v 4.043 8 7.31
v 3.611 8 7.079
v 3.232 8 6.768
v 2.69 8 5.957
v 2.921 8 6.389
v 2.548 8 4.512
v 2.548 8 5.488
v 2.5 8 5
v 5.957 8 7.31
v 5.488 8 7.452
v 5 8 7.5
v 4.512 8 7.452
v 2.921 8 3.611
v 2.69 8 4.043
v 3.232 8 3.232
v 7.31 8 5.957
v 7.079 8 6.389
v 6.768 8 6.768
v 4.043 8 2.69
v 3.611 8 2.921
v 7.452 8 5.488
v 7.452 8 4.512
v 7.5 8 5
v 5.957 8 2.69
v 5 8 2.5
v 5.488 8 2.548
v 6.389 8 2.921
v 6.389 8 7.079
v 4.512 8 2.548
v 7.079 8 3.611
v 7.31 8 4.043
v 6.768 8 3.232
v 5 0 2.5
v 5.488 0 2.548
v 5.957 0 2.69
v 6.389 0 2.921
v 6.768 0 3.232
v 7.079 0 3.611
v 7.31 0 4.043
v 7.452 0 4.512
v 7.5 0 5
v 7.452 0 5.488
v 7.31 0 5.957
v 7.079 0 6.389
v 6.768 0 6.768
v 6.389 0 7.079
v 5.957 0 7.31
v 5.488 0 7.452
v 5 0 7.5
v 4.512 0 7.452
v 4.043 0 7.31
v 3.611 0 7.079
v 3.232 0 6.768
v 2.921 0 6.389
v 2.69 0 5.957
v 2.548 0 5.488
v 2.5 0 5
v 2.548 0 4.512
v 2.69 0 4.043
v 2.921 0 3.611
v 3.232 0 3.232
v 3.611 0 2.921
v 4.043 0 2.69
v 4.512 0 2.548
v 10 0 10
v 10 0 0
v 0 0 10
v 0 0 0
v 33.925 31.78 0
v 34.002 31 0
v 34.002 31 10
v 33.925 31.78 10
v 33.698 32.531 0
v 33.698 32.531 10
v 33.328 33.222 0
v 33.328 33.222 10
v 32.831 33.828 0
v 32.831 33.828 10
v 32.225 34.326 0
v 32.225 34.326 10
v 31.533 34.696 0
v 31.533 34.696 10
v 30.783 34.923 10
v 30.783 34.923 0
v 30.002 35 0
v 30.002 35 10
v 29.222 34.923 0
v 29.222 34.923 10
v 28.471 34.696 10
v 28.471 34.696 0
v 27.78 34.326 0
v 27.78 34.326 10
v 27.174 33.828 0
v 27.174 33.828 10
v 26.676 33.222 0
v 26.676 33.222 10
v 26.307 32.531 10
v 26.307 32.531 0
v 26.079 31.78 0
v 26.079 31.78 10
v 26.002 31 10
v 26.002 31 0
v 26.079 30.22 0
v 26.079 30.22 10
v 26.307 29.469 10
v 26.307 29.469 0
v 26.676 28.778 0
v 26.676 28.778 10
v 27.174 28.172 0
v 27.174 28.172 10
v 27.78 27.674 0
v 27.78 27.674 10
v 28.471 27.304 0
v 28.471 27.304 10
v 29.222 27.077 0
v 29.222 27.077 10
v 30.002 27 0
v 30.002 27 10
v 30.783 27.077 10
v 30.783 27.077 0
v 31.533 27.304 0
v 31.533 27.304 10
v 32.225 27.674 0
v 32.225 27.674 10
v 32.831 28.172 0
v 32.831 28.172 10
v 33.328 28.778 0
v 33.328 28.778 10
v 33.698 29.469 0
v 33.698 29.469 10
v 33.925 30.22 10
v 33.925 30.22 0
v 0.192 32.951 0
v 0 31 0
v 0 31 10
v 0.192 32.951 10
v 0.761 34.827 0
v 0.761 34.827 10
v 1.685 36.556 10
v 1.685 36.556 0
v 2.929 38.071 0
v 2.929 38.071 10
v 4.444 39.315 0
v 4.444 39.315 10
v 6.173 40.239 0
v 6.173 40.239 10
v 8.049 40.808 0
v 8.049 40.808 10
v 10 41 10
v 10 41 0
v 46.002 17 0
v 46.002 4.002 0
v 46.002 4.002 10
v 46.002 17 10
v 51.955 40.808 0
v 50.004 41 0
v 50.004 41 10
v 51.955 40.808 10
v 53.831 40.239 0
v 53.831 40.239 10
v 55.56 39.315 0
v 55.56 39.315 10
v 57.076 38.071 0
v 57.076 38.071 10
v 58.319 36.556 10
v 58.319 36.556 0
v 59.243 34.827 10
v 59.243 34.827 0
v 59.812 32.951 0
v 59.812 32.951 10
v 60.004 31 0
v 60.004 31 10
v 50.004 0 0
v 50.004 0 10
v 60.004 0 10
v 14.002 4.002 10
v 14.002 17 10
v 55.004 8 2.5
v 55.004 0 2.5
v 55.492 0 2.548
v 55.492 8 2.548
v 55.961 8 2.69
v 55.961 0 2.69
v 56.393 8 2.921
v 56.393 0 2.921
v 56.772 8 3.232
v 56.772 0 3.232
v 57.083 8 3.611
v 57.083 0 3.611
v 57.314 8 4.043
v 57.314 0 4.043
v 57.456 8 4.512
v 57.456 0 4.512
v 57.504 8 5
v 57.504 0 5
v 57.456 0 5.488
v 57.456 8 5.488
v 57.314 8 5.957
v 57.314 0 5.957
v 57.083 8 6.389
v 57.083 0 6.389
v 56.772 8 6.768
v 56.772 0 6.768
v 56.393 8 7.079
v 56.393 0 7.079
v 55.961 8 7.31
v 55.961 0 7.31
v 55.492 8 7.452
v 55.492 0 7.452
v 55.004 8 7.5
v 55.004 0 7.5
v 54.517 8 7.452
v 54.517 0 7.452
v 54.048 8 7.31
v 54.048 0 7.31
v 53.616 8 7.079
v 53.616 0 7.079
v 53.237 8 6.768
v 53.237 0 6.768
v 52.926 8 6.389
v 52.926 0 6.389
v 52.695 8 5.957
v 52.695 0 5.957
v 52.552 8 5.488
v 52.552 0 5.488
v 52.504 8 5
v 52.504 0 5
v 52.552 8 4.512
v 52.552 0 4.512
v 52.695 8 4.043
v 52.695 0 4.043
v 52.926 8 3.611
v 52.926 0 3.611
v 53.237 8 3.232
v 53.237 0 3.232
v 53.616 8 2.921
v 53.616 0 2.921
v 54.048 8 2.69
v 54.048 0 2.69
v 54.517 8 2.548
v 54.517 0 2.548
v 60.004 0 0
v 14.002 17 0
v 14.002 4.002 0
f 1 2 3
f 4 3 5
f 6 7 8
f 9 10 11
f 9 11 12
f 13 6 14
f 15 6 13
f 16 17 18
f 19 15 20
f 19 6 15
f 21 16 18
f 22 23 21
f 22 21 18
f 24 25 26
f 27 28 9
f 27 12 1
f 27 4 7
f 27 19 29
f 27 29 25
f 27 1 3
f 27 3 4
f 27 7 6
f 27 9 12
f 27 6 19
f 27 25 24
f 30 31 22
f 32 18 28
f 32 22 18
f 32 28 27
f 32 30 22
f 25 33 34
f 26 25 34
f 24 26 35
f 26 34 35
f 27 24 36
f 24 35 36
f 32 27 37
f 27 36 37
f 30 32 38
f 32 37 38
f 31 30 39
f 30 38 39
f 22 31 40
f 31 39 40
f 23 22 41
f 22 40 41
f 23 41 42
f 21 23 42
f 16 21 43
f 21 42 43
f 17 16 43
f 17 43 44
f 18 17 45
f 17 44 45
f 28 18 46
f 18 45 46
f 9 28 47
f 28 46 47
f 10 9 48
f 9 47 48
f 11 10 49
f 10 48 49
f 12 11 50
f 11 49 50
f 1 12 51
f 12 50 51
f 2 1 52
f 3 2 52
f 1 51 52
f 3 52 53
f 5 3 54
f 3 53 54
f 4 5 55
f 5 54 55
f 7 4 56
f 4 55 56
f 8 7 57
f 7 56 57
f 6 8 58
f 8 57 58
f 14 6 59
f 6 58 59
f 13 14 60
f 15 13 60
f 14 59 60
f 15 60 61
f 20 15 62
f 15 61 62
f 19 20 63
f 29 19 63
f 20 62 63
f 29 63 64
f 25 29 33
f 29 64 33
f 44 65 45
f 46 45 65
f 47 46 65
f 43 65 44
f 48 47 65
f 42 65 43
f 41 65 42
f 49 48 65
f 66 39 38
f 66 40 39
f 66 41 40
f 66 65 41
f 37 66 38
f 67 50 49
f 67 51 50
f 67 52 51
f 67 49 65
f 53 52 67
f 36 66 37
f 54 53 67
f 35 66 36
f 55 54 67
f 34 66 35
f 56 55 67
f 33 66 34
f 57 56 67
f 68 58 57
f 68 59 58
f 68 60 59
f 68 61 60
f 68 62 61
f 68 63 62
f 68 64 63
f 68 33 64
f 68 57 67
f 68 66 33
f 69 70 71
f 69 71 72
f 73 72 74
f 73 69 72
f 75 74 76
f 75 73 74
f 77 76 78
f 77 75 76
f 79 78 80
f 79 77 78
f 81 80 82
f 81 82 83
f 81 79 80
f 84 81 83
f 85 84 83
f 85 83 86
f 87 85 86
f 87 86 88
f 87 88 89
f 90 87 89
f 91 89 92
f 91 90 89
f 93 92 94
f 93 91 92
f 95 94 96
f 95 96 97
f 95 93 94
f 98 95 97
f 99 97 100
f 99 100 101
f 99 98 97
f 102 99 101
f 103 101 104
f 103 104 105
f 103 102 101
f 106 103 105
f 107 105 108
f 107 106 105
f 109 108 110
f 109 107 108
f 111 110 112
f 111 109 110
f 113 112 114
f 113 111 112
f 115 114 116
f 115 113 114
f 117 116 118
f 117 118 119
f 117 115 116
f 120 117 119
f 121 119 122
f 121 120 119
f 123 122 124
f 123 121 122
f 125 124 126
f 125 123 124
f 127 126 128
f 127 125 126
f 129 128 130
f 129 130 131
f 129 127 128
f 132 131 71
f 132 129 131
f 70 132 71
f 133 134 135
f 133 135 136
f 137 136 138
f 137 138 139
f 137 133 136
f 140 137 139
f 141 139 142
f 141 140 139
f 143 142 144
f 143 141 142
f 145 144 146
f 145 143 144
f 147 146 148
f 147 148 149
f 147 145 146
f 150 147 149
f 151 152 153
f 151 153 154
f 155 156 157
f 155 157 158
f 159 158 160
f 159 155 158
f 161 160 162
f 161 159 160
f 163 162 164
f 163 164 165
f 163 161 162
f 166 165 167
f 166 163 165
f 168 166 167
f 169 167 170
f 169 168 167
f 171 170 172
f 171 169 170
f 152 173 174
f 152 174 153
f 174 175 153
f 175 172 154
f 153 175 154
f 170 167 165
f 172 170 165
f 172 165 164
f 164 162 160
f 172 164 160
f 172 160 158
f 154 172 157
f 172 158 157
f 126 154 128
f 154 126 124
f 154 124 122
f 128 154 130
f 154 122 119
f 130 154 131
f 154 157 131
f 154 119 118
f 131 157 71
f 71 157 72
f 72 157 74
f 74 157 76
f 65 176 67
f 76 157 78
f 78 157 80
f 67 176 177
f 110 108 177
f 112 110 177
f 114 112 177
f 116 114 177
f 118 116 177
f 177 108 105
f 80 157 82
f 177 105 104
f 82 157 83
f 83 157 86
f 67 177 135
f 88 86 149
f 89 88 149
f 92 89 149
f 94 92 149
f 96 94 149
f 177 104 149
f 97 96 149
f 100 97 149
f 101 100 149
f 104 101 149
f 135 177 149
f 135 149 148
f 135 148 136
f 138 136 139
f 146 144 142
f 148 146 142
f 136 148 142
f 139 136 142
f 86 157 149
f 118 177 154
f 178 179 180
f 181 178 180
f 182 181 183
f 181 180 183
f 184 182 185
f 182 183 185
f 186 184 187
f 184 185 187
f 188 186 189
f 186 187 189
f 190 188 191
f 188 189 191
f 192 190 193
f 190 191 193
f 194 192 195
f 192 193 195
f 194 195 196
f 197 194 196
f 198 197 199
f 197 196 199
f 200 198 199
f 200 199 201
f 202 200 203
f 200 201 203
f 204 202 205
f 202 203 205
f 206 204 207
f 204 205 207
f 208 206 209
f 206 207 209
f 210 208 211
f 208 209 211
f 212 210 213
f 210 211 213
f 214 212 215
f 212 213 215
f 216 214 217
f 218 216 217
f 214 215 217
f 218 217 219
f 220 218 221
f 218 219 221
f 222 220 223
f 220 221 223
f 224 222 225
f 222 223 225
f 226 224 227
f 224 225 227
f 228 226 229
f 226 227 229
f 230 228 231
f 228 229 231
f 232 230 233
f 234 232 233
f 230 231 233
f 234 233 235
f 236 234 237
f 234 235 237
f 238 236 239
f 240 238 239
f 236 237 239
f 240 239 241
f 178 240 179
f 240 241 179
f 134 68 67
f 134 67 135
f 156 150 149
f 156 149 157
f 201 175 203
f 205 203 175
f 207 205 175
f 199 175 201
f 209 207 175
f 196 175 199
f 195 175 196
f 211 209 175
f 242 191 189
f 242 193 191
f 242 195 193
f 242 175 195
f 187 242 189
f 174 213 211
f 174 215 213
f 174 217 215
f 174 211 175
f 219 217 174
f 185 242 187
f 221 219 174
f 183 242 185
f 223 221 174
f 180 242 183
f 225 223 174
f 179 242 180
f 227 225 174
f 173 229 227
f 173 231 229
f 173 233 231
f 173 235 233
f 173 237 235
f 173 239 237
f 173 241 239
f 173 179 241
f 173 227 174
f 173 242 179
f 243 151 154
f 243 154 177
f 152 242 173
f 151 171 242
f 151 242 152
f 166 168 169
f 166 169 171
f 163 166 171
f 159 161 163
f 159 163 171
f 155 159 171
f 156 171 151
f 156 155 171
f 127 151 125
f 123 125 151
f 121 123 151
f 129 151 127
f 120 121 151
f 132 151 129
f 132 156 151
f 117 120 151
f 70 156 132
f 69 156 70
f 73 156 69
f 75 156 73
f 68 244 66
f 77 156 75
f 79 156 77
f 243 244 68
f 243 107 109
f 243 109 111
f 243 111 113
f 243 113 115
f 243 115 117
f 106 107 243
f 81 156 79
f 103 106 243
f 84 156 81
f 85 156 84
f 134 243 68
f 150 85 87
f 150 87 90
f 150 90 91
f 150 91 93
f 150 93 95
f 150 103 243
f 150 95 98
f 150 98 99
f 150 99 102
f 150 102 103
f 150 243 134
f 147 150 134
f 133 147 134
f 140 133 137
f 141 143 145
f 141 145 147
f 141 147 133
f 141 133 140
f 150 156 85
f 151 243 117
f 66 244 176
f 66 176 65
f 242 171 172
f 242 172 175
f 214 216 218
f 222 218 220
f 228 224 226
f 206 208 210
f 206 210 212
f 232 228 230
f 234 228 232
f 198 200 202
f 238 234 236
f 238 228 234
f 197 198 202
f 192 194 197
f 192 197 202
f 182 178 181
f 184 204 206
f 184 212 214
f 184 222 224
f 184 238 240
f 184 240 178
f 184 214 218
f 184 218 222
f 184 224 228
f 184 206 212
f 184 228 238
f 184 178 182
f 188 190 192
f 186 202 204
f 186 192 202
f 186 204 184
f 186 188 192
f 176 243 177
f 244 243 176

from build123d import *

# Parameters (mm, degrees)
SKETCH1_R           = 4
BOSS_EXTRUDE1_DEPTH = 10
SKETCH2_R           = 2.5
CUT_EXTRUDE1_DEPTH  = 8
SKETCH3_R           = 2.5
CUT_EXTRUDE2_DEPTH  = 8


with BuildPart() as part:
    # Sketch1 → Boss-Extrude1 (new body)
    with BuildSketch(Plane.XY):
        with BuildLine():
            Line((0, 0), (0, 31))
            ThreePointArc((0, 31), (2.928932188, 38.071067812), (10, 41))
            Line((10, 41), (50.004448763, 41))
            ThreePointArc((50.004448763, 41), (57.075516575, 38.071067812), (60.004448763, 31))
            Line((60.004448763, 31), (60.004448763, 0))
            Line((60.004448763, 0), (50.004448763, 0))
            Line((50.004448763, 0), (46.002224382, 4.002224382))
            Line((46.002224382, 4.002224382), (46.002224382, 17))
            Line((46.002224382, 17), (14.002224382, 17))
            Line((14.002224382, 17), (14.002224382, 4.002224382))
            Line((14.002224382, 4.002224382), (10, 0))
            Line((10, 0), (0, 0))
        make_face()
        with Locations((30.002224382, 31)):
            Circle(SKETCH1_R, mode=Mode.SUBTRACT)
    extrude(amount=BOSS_EXTRUDE1_DEPTH)

    # Sketch2 → Cut-Extrude1 (cut)
    with BuildSketch(Plane.XZ):
        with Locations(Location((55.004448763, 5, 0), (0, 0, 270))):
            Circle(SKETCH2_R)
    extrude(amount=-CUT_EXTRUDE1_DEPTH, mode=Mode.SUBTRACT)

    # Sketch3 → Cut-Extrude2 (cut)
    with BuildSketch(Plane.XZ):
        with Locations(Location((5, 5, 0), (0, 0, 270))):
            Circle(SKETCH3_R)
    extrude(amount=-CUT_EXTRUDE2_DEPTH, mode=Mode.SUBTRACT)


solid = part.part
